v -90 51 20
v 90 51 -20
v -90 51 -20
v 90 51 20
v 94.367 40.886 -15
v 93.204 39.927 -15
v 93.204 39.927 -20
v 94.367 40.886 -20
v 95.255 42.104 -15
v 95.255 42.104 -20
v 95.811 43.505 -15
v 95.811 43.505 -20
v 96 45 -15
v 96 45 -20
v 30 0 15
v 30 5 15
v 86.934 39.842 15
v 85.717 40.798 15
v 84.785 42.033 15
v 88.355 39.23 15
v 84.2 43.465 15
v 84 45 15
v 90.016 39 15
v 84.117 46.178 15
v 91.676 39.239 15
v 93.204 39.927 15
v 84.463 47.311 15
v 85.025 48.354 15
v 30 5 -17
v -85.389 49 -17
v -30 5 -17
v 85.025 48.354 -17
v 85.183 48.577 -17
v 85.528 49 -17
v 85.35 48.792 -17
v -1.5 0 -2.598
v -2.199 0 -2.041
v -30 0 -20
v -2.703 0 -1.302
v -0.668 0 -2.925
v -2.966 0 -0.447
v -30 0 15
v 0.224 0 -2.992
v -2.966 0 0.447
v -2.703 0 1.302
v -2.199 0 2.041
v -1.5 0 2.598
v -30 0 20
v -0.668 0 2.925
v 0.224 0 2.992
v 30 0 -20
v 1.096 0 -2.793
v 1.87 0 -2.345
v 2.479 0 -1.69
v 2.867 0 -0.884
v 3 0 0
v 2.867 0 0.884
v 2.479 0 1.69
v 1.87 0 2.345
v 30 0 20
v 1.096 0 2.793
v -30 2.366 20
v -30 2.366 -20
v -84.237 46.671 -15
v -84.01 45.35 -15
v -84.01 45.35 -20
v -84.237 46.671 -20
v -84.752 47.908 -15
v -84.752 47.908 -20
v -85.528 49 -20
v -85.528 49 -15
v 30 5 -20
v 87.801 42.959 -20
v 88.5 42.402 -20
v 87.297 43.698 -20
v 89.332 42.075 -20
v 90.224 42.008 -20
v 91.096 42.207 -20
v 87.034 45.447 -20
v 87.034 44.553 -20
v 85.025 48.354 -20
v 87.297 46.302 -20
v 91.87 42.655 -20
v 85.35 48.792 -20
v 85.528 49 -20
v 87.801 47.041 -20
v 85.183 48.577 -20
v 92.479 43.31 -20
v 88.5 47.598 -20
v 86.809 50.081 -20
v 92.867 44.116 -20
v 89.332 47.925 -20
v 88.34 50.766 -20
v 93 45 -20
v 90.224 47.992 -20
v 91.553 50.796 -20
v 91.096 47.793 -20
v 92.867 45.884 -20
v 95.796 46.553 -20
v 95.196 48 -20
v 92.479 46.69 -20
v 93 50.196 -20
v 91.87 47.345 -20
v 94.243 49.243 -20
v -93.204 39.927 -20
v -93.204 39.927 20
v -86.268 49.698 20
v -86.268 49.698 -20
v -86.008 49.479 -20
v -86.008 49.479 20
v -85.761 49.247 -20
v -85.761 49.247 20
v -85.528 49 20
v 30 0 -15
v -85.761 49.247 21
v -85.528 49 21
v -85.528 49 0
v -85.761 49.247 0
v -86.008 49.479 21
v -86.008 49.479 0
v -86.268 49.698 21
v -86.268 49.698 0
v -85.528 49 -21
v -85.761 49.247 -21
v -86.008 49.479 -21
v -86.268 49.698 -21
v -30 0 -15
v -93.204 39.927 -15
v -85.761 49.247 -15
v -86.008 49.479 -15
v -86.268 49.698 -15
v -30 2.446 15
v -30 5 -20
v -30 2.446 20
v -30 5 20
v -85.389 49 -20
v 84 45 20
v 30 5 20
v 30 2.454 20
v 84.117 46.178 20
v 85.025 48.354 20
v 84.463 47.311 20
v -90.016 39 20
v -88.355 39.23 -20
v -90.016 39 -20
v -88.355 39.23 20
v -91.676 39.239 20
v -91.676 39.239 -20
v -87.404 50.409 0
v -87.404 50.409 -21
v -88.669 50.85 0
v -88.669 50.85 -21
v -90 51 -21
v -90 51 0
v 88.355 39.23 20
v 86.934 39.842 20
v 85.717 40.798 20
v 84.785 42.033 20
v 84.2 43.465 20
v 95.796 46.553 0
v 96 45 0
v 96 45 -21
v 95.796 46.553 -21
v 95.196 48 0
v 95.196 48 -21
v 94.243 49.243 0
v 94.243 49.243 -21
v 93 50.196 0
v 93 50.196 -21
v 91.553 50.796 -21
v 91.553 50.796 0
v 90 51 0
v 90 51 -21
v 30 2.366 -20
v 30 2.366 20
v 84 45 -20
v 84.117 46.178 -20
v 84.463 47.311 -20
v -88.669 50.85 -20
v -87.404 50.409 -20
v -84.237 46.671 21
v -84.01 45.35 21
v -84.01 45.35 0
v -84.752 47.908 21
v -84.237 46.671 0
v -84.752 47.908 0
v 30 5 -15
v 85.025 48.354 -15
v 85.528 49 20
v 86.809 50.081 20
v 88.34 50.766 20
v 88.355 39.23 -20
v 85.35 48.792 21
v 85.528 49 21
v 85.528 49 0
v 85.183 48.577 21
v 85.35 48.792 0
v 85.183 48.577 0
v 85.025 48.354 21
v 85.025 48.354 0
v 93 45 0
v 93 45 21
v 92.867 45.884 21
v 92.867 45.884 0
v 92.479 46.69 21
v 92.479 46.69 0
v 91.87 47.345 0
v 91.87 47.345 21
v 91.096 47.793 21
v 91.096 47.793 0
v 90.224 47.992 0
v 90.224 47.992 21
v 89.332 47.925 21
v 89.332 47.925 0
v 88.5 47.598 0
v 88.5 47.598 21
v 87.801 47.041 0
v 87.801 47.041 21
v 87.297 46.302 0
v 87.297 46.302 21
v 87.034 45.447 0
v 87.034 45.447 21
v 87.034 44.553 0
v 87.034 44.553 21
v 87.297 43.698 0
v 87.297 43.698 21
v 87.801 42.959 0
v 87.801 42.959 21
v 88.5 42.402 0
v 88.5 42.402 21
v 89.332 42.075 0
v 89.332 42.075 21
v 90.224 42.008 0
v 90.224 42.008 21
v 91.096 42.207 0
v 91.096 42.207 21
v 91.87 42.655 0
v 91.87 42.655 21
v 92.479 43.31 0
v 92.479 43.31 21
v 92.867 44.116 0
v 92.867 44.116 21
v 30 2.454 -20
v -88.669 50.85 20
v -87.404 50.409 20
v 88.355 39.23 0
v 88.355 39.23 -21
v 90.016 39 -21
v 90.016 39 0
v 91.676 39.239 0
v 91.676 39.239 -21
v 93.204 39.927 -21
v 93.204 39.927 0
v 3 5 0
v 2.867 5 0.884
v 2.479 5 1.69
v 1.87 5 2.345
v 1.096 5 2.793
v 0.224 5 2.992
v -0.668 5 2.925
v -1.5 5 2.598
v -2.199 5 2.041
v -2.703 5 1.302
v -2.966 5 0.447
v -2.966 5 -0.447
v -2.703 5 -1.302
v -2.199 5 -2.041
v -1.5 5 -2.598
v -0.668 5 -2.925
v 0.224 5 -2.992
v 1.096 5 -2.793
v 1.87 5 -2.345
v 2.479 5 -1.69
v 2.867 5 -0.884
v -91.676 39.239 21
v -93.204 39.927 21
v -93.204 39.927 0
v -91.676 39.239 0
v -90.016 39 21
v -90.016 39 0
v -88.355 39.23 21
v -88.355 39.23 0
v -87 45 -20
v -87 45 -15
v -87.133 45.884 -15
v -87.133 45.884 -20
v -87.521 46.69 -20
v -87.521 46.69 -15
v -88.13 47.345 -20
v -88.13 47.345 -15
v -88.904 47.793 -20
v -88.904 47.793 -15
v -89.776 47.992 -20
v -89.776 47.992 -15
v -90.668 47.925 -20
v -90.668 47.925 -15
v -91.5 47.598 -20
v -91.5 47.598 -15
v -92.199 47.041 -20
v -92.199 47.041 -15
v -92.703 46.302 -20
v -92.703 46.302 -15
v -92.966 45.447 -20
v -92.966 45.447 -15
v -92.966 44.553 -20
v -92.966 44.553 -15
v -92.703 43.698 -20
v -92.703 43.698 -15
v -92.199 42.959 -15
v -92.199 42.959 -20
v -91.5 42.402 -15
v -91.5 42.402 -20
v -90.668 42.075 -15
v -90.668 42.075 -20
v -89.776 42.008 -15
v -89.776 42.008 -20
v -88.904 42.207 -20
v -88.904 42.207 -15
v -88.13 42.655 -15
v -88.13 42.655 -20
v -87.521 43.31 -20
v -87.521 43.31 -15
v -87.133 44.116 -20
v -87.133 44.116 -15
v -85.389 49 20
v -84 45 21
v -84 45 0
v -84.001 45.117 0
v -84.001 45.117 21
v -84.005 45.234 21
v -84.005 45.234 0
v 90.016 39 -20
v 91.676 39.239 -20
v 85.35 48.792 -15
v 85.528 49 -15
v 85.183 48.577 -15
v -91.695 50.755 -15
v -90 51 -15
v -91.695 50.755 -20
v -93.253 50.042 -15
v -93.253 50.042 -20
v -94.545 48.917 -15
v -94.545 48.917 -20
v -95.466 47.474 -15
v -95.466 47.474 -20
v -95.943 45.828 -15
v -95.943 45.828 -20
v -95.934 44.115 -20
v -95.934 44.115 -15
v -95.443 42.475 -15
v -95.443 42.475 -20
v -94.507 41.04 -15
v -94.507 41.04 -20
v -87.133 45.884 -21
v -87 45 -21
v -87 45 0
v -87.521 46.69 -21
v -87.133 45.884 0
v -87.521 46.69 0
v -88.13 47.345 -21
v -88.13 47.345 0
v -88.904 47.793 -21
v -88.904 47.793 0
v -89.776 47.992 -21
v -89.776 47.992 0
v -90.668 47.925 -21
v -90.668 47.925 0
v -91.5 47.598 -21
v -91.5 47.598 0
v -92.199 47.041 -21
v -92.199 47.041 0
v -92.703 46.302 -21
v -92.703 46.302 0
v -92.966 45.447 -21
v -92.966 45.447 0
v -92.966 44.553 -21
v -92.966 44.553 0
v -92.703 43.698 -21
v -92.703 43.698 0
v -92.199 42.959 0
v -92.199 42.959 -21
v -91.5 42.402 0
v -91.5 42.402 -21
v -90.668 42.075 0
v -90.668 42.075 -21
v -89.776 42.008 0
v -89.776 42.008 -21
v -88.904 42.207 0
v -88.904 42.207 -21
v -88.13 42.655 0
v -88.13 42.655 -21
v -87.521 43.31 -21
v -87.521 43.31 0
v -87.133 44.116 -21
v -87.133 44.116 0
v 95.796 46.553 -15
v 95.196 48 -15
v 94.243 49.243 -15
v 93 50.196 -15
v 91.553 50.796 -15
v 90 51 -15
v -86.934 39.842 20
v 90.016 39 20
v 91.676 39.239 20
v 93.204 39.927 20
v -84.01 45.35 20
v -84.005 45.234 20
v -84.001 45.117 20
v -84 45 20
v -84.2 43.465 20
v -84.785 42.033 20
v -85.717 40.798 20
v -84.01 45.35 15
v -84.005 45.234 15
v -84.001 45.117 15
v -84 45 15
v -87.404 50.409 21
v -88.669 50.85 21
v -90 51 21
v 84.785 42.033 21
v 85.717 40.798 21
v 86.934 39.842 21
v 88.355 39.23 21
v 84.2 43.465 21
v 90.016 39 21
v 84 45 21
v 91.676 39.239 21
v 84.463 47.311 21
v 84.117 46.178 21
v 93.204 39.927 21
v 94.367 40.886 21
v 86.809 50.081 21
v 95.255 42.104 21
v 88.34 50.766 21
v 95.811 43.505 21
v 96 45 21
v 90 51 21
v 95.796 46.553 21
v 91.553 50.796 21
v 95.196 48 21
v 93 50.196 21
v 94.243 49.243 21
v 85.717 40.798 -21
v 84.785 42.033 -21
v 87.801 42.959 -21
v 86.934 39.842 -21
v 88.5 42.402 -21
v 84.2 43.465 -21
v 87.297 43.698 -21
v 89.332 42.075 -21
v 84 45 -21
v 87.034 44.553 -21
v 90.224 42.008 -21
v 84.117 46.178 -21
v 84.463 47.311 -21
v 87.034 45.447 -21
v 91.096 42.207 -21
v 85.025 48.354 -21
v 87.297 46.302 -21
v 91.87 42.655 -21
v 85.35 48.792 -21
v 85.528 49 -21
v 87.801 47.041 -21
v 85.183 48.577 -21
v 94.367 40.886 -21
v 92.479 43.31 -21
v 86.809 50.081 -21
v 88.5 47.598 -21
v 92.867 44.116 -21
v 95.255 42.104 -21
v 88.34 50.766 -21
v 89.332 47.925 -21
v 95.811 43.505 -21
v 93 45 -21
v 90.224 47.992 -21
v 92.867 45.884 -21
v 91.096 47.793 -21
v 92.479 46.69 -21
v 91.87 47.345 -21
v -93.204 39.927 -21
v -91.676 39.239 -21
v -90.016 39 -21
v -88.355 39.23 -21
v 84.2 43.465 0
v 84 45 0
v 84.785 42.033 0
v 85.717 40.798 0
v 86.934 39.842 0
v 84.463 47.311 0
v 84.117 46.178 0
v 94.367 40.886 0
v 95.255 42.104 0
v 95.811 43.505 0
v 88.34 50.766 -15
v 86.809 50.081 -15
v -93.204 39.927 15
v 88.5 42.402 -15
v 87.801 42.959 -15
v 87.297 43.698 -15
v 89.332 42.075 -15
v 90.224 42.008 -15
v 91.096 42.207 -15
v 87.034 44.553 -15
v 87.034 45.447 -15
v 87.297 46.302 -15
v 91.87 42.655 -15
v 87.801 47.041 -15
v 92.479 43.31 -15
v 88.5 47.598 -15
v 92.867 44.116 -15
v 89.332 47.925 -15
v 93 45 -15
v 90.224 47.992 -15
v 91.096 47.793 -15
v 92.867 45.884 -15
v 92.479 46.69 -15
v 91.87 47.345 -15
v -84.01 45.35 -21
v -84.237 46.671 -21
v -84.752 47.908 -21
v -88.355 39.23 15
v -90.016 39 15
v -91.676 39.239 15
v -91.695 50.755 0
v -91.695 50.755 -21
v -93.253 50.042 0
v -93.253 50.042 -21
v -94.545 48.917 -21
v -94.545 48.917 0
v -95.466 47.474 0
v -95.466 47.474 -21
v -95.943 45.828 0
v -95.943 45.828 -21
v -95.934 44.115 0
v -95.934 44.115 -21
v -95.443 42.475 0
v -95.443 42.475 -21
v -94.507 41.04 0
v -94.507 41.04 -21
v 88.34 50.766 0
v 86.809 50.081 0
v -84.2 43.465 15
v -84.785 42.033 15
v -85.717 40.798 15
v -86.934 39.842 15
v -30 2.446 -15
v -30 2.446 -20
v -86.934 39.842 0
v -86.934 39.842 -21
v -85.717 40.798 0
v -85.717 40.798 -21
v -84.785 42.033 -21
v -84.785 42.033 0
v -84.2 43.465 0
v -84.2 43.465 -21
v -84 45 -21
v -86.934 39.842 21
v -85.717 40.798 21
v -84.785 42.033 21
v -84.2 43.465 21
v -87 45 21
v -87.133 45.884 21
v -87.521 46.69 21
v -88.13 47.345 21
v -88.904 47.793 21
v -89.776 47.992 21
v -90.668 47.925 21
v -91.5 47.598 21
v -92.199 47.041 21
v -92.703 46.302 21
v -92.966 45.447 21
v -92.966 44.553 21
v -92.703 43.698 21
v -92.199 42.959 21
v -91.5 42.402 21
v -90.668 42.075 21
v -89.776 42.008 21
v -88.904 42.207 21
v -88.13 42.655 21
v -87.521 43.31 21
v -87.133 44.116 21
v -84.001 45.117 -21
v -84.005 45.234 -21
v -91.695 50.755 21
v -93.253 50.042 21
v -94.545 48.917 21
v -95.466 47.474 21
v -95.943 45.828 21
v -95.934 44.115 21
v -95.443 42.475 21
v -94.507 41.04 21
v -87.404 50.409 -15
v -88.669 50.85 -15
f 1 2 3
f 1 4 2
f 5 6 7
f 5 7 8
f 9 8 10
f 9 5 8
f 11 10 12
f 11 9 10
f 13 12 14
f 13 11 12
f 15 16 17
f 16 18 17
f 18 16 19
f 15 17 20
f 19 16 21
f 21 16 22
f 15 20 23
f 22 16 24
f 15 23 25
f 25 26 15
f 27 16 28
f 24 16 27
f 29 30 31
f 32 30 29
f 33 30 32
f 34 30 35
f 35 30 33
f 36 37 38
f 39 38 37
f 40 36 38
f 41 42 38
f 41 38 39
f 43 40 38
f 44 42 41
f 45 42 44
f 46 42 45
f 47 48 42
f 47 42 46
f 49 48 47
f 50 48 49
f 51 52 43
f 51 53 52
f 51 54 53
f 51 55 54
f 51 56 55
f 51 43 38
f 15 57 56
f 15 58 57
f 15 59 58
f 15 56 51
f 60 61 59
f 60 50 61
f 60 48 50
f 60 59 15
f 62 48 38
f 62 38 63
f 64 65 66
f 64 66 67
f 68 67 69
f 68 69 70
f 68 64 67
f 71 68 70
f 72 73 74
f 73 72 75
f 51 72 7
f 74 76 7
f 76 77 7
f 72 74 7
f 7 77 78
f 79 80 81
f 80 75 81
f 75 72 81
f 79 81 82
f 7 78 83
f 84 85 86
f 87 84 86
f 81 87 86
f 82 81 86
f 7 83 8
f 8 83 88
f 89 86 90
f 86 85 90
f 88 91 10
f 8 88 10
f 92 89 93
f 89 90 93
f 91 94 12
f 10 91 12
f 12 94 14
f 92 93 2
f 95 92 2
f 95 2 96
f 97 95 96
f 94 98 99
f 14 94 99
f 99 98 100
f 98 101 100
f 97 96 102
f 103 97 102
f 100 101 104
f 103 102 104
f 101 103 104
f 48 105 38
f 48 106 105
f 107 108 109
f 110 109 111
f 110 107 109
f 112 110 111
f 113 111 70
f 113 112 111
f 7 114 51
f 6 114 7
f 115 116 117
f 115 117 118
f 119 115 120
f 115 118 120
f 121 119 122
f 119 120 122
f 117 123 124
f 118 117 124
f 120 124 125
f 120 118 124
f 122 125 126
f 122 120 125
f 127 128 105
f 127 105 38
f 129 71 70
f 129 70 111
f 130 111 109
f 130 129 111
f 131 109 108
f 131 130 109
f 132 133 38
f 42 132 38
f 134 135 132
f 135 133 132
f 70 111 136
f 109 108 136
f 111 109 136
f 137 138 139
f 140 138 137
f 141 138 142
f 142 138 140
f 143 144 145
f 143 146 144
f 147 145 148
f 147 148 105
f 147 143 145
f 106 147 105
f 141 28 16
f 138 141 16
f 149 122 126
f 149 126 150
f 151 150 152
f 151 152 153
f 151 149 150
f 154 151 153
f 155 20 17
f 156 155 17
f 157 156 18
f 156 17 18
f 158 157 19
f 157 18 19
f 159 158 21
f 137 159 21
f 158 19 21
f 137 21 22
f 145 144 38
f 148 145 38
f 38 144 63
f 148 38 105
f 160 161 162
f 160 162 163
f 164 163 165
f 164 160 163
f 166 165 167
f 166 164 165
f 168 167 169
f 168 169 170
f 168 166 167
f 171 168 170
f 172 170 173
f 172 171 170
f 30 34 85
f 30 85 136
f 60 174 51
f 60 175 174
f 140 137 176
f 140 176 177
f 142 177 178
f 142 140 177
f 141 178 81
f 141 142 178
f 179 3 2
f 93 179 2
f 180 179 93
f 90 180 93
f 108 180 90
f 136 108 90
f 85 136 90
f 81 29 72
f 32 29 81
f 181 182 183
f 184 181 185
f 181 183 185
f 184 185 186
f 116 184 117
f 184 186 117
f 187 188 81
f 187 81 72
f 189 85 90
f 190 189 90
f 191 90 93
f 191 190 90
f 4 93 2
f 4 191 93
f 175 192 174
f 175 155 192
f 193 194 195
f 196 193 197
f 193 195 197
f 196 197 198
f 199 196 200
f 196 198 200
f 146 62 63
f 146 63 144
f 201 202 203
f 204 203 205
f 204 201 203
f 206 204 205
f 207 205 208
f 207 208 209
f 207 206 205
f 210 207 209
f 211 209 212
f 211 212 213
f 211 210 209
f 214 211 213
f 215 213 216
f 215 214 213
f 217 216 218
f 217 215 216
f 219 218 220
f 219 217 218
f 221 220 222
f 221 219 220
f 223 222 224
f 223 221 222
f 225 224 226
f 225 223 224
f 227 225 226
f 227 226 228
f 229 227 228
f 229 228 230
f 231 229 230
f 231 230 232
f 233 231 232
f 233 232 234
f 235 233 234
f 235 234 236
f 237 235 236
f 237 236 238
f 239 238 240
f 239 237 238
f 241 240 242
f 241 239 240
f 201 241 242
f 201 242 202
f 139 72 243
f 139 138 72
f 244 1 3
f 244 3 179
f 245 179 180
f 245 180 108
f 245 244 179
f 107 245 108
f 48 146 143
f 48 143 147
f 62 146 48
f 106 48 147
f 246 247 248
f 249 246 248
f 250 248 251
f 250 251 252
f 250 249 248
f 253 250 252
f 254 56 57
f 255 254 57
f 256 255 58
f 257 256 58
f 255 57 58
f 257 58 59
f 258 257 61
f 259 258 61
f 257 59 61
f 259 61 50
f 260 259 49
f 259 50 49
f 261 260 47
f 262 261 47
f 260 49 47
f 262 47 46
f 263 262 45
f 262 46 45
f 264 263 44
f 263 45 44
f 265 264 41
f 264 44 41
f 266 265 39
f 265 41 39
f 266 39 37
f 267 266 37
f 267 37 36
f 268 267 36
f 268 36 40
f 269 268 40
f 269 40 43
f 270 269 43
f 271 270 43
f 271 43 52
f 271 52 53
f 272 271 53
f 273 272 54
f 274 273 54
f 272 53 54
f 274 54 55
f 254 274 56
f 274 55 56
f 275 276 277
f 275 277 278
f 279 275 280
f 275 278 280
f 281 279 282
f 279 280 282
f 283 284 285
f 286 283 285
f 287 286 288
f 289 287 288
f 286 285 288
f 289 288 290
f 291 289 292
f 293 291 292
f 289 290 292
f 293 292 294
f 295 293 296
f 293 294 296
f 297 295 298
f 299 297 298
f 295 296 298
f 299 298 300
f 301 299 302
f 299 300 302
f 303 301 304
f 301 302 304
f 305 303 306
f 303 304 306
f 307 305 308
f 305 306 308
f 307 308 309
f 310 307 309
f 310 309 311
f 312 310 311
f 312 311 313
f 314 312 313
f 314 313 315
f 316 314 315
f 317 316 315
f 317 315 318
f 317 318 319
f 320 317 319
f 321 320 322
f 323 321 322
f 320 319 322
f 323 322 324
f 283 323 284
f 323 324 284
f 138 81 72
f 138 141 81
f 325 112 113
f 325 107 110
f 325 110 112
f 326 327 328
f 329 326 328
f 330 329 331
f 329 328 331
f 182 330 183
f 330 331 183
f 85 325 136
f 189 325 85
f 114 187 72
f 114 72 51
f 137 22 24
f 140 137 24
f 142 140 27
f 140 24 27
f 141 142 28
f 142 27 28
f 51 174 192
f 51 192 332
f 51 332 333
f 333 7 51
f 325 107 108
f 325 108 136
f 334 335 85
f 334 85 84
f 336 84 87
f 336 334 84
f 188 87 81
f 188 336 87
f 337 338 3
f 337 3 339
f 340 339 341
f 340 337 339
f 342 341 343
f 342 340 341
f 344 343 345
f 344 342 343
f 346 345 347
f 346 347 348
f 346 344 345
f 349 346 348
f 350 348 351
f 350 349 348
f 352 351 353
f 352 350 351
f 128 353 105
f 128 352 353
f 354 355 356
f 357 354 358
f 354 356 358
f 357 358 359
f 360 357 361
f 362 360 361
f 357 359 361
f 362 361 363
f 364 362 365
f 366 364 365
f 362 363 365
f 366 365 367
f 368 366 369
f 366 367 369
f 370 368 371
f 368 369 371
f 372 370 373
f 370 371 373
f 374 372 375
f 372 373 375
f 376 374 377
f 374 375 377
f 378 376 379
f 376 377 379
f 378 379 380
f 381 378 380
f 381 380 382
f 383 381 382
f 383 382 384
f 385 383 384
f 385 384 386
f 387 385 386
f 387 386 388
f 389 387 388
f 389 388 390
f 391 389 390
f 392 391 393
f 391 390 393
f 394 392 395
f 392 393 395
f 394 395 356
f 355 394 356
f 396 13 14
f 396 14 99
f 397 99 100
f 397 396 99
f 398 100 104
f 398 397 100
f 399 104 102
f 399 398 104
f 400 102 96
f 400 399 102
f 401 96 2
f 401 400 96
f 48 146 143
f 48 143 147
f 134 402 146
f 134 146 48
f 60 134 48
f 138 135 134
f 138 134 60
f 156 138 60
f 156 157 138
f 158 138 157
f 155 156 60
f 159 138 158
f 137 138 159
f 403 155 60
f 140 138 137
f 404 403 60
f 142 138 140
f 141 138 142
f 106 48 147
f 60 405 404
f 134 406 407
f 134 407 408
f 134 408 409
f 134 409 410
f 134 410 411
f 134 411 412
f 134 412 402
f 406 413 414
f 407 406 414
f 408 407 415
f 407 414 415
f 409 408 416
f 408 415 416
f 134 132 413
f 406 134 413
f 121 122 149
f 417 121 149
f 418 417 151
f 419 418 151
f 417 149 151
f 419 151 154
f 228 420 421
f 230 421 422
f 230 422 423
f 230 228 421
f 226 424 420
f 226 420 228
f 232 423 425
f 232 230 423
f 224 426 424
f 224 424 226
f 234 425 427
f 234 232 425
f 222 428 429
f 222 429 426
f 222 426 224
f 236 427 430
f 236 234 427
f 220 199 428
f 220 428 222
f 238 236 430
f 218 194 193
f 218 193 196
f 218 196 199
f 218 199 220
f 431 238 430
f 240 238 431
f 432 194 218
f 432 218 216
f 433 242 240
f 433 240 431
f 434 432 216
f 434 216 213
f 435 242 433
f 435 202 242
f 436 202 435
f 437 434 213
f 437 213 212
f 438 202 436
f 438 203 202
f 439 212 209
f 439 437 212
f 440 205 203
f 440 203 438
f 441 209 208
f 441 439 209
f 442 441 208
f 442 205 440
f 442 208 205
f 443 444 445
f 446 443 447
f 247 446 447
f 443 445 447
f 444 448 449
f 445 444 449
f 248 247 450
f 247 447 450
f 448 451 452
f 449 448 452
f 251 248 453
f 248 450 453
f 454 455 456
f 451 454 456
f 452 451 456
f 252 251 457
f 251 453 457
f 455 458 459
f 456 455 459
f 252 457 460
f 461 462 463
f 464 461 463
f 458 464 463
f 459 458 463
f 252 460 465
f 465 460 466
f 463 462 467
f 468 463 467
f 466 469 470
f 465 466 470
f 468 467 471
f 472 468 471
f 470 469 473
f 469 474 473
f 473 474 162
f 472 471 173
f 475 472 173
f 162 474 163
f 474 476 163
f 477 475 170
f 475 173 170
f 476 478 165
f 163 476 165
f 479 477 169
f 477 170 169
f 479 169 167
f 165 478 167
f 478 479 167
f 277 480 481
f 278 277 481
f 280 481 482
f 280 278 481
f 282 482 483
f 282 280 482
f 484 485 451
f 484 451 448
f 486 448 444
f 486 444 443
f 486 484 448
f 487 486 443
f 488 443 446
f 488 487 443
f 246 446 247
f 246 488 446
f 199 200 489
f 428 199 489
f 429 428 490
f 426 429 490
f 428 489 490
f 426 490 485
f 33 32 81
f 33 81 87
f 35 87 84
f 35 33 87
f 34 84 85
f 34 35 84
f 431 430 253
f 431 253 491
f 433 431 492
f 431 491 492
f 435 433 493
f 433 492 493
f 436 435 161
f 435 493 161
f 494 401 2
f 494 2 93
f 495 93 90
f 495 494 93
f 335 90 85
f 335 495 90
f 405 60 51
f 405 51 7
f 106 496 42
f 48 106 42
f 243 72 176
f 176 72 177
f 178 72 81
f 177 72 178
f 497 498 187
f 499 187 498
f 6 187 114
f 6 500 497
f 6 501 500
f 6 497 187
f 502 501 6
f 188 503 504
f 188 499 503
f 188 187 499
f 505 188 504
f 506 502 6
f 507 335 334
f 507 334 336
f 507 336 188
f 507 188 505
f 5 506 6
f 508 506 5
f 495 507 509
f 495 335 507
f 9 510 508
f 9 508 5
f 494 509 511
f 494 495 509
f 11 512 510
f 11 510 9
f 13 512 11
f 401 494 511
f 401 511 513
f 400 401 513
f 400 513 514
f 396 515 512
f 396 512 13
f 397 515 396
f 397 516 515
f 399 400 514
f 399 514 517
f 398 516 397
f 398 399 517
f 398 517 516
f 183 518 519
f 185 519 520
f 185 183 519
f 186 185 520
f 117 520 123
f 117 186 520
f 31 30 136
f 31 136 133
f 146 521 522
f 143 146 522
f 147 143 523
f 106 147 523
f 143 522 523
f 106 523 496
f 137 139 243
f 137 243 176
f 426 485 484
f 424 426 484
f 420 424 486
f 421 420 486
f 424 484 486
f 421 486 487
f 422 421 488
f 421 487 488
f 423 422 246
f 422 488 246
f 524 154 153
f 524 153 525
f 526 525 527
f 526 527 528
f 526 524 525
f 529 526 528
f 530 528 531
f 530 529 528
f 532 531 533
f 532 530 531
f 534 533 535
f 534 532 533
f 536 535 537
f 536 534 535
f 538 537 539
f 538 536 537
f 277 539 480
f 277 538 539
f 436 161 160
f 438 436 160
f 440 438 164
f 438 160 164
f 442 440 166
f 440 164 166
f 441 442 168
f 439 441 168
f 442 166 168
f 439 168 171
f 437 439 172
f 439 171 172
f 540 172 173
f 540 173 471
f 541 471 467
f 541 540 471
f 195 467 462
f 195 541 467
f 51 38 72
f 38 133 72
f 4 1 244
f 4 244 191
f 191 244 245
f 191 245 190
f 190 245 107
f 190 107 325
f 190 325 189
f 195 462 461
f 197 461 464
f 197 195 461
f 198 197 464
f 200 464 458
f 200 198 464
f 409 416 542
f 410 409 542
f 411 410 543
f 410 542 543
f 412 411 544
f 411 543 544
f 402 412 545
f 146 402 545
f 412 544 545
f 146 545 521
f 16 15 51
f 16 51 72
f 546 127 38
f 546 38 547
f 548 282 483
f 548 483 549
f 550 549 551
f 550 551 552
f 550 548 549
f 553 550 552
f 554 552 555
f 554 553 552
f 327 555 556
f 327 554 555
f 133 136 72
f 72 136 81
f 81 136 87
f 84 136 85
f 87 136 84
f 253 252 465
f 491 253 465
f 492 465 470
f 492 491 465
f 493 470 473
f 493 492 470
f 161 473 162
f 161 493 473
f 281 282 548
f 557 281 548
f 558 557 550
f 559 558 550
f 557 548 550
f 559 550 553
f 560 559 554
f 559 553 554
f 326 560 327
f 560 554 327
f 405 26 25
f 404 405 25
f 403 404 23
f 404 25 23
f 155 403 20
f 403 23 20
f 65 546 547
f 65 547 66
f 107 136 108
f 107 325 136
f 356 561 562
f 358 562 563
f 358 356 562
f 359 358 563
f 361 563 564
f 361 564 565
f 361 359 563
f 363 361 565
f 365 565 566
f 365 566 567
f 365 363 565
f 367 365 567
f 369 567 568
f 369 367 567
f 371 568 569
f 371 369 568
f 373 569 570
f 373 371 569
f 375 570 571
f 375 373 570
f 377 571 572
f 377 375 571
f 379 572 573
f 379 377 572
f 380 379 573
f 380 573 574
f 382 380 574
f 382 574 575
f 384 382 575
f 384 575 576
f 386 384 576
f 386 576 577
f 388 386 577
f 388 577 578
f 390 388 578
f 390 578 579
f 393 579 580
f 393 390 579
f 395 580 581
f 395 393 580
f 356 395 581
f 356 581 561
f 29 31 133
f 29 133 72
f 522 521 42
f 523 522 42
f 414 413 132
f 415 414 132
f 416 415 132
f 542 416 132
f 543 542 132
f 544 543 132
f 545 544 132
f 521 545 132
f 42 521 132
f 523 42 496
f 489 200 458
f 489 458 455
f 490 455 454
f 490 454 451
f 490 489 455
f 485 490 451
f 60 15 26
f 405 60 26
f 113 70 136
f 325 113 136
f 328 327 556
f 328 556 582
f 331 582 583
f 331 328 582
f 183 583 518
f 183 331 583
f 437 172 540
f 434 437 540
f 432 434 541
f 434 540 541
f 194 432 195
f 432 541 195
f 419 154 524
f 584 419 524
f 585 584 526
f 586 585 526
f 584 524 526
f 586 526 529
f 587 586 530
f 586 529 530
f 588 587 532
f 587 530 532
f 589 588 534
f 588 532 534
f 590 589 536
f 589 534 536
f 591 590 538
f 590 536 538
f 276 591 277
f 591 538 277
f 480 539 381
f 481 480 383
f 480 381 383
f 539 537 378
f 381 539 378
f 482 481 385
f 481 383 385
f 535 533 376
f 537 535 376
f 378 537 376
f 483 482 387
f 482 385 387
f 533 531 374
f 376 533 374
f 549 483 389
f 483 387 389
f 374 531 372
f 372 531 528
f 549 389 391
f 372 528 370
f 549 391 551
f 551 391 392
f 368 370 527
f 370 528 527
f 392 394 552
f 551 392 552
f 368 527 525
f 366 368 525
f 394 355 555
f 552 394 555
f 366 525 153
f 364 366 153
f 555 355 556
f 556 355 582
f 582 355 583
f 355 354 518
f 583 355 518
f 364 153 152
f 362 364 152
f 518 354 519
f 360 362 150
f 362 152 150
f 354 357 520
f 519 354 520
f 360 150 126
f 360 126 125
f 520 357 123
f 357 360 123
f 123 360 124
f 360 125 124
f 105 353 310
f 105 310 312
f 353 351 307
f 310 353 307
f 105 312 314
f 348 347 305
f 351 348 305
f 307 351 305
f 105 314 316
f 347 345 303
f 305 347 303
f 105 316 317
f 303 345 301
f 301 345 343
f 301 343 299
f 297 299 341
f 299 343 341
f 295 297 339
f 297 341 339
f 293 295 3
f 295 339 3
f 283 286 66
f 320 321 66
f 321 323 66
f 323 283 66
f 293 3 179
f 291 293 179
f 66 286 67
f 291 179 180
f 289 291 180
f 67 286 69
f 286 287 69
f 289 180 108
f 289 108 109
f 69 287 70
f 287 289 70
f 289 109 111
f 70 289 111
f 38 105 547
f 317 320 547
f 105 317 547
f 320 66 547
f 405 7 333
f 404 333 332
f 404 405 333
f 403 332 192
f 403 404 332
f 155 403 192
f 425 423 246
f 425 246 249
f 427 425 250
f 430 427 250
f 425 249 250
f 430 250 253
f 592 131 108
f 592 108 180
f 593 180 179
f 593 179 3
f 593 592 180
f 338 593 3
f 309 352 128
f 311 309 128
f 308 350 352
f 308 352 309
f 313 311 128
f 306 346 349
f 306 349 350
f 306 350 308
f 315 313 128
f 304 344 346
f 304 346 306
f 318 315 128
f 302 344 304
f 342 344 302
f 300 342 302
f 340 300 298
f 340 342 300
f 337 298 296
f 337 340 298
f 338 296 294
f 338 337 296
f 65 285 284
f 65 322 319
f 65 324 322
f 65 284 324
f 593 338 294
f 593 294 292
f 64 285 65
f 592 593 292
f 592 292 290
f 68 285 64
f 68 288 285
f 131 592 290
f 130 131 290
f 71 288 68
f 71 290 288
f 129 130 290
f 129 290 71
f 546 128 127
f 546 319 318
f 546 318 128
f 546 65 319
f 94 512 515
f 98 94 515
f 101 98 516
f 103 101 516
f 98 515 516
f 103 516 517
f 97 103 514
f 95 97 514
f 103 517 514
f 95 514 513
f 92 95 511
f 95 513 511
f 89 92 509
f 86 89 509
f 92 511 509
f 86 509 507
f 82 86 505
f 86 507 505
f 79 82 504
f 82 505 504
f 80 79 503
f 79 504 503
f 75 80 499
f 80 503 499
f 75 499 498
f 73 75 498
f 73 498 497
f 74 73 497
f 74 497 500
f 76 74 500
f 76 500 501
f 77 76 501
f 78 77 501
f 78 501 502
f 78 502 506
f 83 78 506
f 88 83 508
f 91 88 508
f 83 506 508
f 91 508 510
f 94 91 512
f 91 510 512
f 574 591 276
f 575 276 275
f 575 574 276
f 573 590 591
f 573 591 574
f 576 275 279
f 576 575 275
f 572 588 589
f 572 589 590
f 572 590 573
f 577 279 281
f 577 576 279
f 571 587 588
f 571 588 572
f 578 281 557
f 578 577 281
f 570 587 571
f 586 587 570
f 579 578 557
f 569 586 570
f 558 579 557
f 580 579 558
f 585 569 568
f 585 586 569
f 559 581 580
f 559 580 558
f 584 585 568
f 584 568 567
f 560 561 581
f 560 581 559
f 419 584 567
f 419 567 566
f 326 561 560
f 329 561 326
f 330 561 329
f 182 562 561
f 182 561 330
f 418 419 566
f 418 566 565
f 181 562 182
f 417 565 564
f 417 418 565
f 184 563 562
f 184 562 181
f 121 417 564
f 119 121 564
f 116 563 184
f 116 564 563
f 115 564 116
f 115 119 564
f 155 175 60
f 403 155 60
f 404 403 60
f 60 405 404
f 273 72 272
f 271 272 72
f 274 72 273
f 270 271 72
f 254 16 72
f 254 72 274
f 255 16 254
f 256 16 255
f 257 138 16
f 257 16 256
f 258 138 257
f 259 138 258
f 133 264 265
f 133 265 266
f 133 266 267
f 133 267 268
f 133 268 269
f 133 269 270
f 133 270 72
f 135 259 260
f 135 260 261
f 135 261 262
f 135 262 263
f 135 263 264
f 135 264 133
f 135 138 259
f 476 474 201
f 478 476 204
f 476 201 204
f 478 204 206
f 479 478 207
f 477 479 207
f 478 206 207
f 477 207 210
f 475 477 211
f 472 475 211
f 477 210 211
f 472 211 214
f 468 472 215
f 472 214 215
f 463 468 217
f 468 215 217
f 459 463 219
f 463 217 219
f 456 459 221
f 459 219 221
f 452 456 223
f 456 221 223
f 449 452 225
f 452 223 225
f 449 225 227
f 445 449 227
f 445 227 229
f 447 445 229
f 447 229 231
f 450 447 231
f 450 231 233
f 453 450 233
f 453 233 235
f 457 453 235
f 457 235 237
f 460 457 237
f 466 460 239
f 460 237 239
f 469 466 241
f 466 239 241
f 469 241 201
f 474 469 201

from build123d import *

# Parameters (mm, degrees)
F1_START      = -15
F0_R          = 3
F1_DEPTH      = 5
F2_DEPTH      = 20
F3_START      = -17
F3_DEPTH      = 3
F4_START      = 15
F4_DEPTH      = 5
F5_DEPTH      = 21
F5_DEPTH_BACK = 21
F6_R          = 3
F7_DEPTH      = 5
F8_DEPTH      = 20
F8_DEPTH_BACK = 20
F9_DEPTH      = 20
F9_DEPTH_BACK = 20


with BuildPart() as f1:
    # F0 (on Top) → F1 (new body)
    with BuildSketch(Plane.XY.offset(F1_START)):
        with BuildLine():
            Line((-93.2044615088, 39.927384655), (-30, 0))
            Line((-30, 0), (-30, 2.3656435948))
            Line((-30, 2.3656435948), (-88.3554034274, 39.2297918483))
            ThreePointArc((-88.3554034274, 39.2297918483), (-90.8543732122, 39.0611409838), (-93.2044615088, 39.927384655))
        make_face()
        with BuildLine():
            Line((-88.3554034274, 39.2297918483), (-30, 2.3656435948))
            Line((-30, 2.3656435948), (-30, 2.4457583538))
            Line((-30, 2.4457583538), (-84.0102370798, 45.3503429172))
            ThreePointArc((-84.0102370798, 45.3503429172), (-84.002559816, 45.175246225), (-84, 45))
            ThreePointArc((-84, 45), (-85.2110763508, 41.3852786716), (-88.3554034274, 39.2297918483))
        make_face()
        with BuildLine():
            ThreePointArc((-90, 51), (-95.7634925206, 46.6679790061), (-93.2044615088, 39.927384655))
            ThreePointArc((-93.2044615088, 39.927384655), (-90.8543732122, 39.0611409838), (-88.3554034274, 39.2297918483))
            ThreePointArc((-88.3554034274, 39.2297918483), (-85.2110763508, 41.3852786716), (-84, 45))
            ThreePointArc((-84, 45), (-84.002559816, 45.175246225), (-84.0102370798, 45.3503429172))
            ThreePointArc((-84.0102370798, 45.3503429172), (-84.4598888798, 47.3037293191), (-85.527864045, 49))
            ThreePointArc((-85.527864045, 49), (-85.8830871702, 49.3647484179), (-86.2679549126, 49.698067631))
            ThreePointArc((-86.2679549126, 49.698067631), (-88.0236910396, 50.6651745686), (-90, 51))
        make_face()
        with Locations((-90, 45)):
            Circle(F0_R, mode=Mode.SUBTRACT)
    extrude(amount=-F1_DEPTH)


with BuildPart() as f1b:
    # F0 (on Top) → F1, piece 2 (new body)
    with BuildSketch(Plane.XY.offset(F1_START)):
        with BuildLine():
            Line((30, 2.3656435948), (30, 0))
            Line((30, 0), (93.2044615088, 39.927384655))
            ThreePointArc((93.2044615088, 39.927384655), (90.8543732122, 39.0611409838), (88.3554034274, 39.2297918483))
            Line((88.3554034274, 39.2297918483), (30, 2.3656435948))
        make_face()
        with BuildLine():
            Line((30, 2.4538071327), (30, 2.3656435948))
            Line((30, 2.3656435948), (88.3554034274, 39.2297918483))
            ThreePointArc((88.3554034274, 39.2297918483), (85.2110763508, 41.3852786716), (84, 45))
            Line((84, 45), (30, 2.4538071327))
        make_face()
        with BuildLine():
            ThreePointArc((88.3554034274, 39.2297918483), (90.8543732122, 39.0611409838), (93.2044615088, 39.927384655))
            ThreePointArc((93.2044615088, 39.927384655), (95.2548439107, 42.1040346215), (96, 45))
            ThreePointArc((96, 45), (94.2426406871, 49.2426406871), (90, 51))
            ThreePointArc((90, 51), (87.5505102572, 50.4772255751), (85.527864045, 49))
            ThreePointArc((85.527864045, 49), (85.2652230991, 48.6853612711), (85.0246748585, 48.3535264627))
            ThreePointArc((85.0246748585, 48.3535264627), (84.261883983, 46.7532896439), (84, 45))
            ThreePointArc((84, 45), (85.2110763508, 41.3852786716), (88.3554034274, 39.2297918483))
        make_face()
        with Locations((90, 45)):
            Circle(F0_R, mode=Mode.SUBTRACT)
        with BuildLine():
            Line((30, 5), (30, 2.4538071327))
            Line((30, 2.4538071327), (84, 45))
            ThreePointArc((84, 45), (84.261883983, 46.7532896439), (85.0246748585, 48.3535264627))
            Line((85.0246748585, 48.3535264627), (30, 5))
        make_face()
    extrude(amount=-F1_DEPTH)


with BuildPart() as f2:
    # F0 (on Top) → F2 (new body, symmetric)
    with BuildSketch(Plane.XY):
        Polygon((-30, 2.3656435948), (-30, 0), (30, 0), (30, 2.3656435948), (30, 2.4538071327), (30, 5), (-30, 5), (-30, 2.4457583538), align=None)
    extrude(amount=F2_DEPTH, both=True)

    # F0 (on Top) → F4 (join)
    with BuildSketch(Plane.XY.offset(F4_START)):
        with BuildLine():
            Line((-93.2044615088, 39.927384655), (-30, 0))
            Line((-30, 0), (-30, 2.3656435948))
            Line((-30, 2.3656435948), (-88.3554034274, 39.2297918483))
            ThreePointArc((-88.3554034274, 39.2297918483), (-90.8543732122, 39.0611409838), (-93.2044615088, 39.927384655))
        make_face()
        with BuildLine():
            Line((30, 2.3656435948), (30, 0))
            Line((30, 0), (93.2044615088, 39.927384655))
            ThreePointArc((93.2044615088, 39.927384655), (90.8543732122, 39.0611409838), (88.3554034274, 39.2297918483))
            Line((88.3554034274, 39.2297918483), (30, 2.3656435948))
        make_face()
        with BuildLine():
            Line((-88.3554034274, 39.2297918483), (-30, 2.3656435948))
            Line((-30, 2.3656435948), (-30, 2.4457583538))
            Line((-30, 2.4457583538), (-84.0102370798, 45.3503429172))
            ThreePointArc((-84.0102370798, 45.3503429172), (-84.002559816, 45.175246225), (-84, 45))
            ThreePointArc((-84, 45), (-85.2110763508, 41.3852786716), (-88.3554034274, 39.2297918483))
        make_face()
        with BuildLine():
            Line((30, 2.4538071327), (30, 2.3656435948))
            Line((30, 2.3656435948), (88.3554034274, 39.2297918483))
            ThreePointArc((88.3554034274, 39.2297918483), (85.2110763508, 41.3852786716), (84, 45))
            Line((84, 45), (30, 2.4538071327))
        make_face()
        with BuildLine():
            Line((30, 5), (30, 2.4538071327))
            Line((30, 2.4538071327), (84, 45))
            ThreePointArc((84, 45), (84.261883983, 46.7532896439), (85.0246748585, 48.3535264627))
            Line((85.0246748585, 48.3535264627), (30, 5))
        make_face()
    extrude(amount=F4_DEPTH)

    # F6 (on Front) → F7 (cut)
    with BuildSketch(Plane.XZ):
        Circle(F6_R)
    extrude(amount=-F7_DEPTH, mode=Mode.SUBTRACT)


with BuildPart() as f3:
    # F0 (on Top) → F3 (new body)
    with BuildSketch(Plane.XY.offset(F3_START)):
        with BuildLine():
            Line((-85.3891957163, 49), (-30, 5))
            Line((-30, 5), (30, 5))
            Line((30, 5), (85.0246748585, 48.3535264627))
            ThreePointArc((85.0246748585, 48.3535264627), (85.2652230991, 48.6853612711), (85.527864045, 49))
            Line((85.527864045, 49), (-85.3891957163, 49))
        make_face()
    extrude(amount=-F3_DEPTH)


with BuildPart() as f5:
    # F0 (on Top) → F5 (new body, two sides)
    with BuildSketch(Plane.XY) as f5_sk:
        with BuildLine():
            ThreePointArc((-90, 51), (-95.7634925206, 46.6679790061), (-93.2044615088, 39.927384655))
            ThreePointArc((-93.2044615088, 39.927384655), (-90.8543732122, 39.0611409838), (-88.3554034274, 39.2297918483))
            ThreePointArc((-88.3554034274, 39.2297918483), (-85.2110763508, 41.3852786716), (-84, 45))
            ThreePointArc((-84, 45), (-84.002559816, 45.175246225), (-84.0102370798, 45.3503429172))
            ThreePointArc((-84.0102370798, 45.3503429172), (-84.4598888798, 47.3037293191), (-85.527864045, 49))
            ThreePointArc((-85.527864045, 49), (-85.8830871702, 49.3647484179), (-86.2679549126, 49.698067631))
            ThreePointArc((-86.2679549126, 49.698067631), (-88.0236910396, 50.6651745686), (-90, 51))
        make_face()
        with Locations((-90, 45)):
            Circle(F0_R, mode=Mode.SUBTRACT)
    extrude(amount=F5_DEPTH)
    extrude(f5_sk.sketch, amount=-F5_DEPTH_BACK)


with BuildPart() as f5b:
    # F0 (on Top) → F5, piece 2 (new body, two sides)
    with BuildSketch(Plane.XY) as f5_2_sk:
        with BuildLine():
            ThreePointArc((88.3554034274, 39.2297918483), (90.8543732122, 39.0611409838), (93.2044615088, 39.927384655))
            ThreePointArc((93.2044615088, 39.927384655), (95.2548439107, 42.1040346215), (96, 45))
            ThreePointArc((96, 45), (94.2426406871, 49.2426406871), (90, 51))
            ThreePointArc((90, 51), (87.5505102572, 50.4772255751), (85.527864045, 49))
            ThreePointArc((85.527864045, 49), (85.2652230991, 48.6853612711), (85.0246748585, 48.3535264627))
            ThreePointArc((85.0246748585, 48.3535264627), (84.261883983, 46.7532896439), (84, 45))
            ThreePointArc((84, 45), (85.2110763508, 41.3852786716), (88.3554034274, 39.2297918483))
        make_face()
        with Locations((90, 45)):
            Circle(F0_R, mode=Mode.SUBTRACT)
    extrude(amount=F5_DEPTH)
    extrude(f5_2_sk.sketch, amount=-F5_DEPTH_BACK)


with BuildPart() as f8:
    # F0 (on Top) → F8 (new body, two sides)
    with BuildSketch(Plane.XY) as f8_sk:
        with BuildLine():
            Line((-93.2044615088, 39.927384655), (-30, 0))
            Line((-30, 0), (-30, 2.3656435948))
            Line((-30, 2.3656435948), (-88.3554034274, 39.2297918483))
            ThreePointArc((-88.3554034274, 39.2297918483), (-90.8543732122, 39.0611409838), (-93.2044615088, 39.927384655))
        make_face()
    extrude(amount=F8_DEPTH)
    extrude(f8_sk.sketch, amount=-F8_DEPTH_BACK)


with BuildPart() as f8b:
    # F0 (on Top) → F8, piece 2 (new body, two sides)
    with BuildSketch(Plane.XY) as f8_2_sk:
        with BuildLine():
            Line((30, 2.3656435948), (30, 0))
            Line((30, 0), (93.2044615088, 39.927384655))
            ThreePointArc((93.2044615088, 39.927384655), (90.8543732122, 39.0611409838), (88.3554034274, 39.2297918483))
            Line((88.3554034274, 39.2297918483), (30, 2.3656435948))
        make_face()
    extrude(amount=F8_DEPTH)
    extrude(f8_2_sk.sketch, amount=-F8_DEPTH_BACK)


with BuildPart() as f8c:
    # F0 (on Top) → F8, piece 3 (new body, two sides)
    with BuildSketch(Plane.XY) as f8_3_sk:
        with BuildLine():
            Line((30, 5), (30, 2.4538071327))
            Line((30, 2.4538071327), (84, 45))
            ThreePointArc((84, 45), (84.261883983, 46.7532896439), (85.0246748585, 48.3535264627))
            Line((85.0246748585, 48.3535264627), (30, 5))
        make_face()
    extrude(amount=F8_DEPTH)
    extrude(f8_3_sk.sketch, amount=-F8_DEPTH_BACK)


with BuildPart() as f8d:
    # F0 (on Top) → F8, piece 4 (new body, two sides)
    with BuildSketch(Plane.XY) as f8_4_sk:
        with BuildLine():
            Line((-85.3891957163, 49), (-86.2679549126, 49.698067631))
            ThreePointArc((-86.2679549126, 49.698067631), (-85.8830871702, 49.3647484179), (-85.527864045, 49))
            Line((-85.527864045, 49), (-85.3891957163, 49))
        make_face()
    extrude(amount=F8_DEPTH)
    extrude(f8_4_sk.sketch, amount=-F8_DEPTH_BACK)


with BuildPart() as f9:
    # F0 (on Top) → F9 (new body, two sides)
    with BuildSketch(Plane.XY) as f9_sk:
        with BuildLine():
            Line((90, 51), (-90, 51))
            ThreePointArc((-90, 51), (-88.0236910396, 50.6651745686), (-86.2679549126, 49.698067631))
            Line((-86.2679549126, 49.698067631), (-85.3891957163, 49))
            Line((-85.3891957163, 49), (85.527864045, 49))
            ThreePointArc((85.527864045, 49), (87.5505102572, 50.4772255751), (90, 51))
        make_face()
    extrude(amount=F9_DEPTH)
    extrude(f9_sk.sketch, amount=-F9_DEPTH_BACK)


solid = Compound([f1.part, f1b.part, f2.part, f3.part, f5.part, f5b.part, f8.part, f8b.part, f8c.part, f8d.part, f9.part])
